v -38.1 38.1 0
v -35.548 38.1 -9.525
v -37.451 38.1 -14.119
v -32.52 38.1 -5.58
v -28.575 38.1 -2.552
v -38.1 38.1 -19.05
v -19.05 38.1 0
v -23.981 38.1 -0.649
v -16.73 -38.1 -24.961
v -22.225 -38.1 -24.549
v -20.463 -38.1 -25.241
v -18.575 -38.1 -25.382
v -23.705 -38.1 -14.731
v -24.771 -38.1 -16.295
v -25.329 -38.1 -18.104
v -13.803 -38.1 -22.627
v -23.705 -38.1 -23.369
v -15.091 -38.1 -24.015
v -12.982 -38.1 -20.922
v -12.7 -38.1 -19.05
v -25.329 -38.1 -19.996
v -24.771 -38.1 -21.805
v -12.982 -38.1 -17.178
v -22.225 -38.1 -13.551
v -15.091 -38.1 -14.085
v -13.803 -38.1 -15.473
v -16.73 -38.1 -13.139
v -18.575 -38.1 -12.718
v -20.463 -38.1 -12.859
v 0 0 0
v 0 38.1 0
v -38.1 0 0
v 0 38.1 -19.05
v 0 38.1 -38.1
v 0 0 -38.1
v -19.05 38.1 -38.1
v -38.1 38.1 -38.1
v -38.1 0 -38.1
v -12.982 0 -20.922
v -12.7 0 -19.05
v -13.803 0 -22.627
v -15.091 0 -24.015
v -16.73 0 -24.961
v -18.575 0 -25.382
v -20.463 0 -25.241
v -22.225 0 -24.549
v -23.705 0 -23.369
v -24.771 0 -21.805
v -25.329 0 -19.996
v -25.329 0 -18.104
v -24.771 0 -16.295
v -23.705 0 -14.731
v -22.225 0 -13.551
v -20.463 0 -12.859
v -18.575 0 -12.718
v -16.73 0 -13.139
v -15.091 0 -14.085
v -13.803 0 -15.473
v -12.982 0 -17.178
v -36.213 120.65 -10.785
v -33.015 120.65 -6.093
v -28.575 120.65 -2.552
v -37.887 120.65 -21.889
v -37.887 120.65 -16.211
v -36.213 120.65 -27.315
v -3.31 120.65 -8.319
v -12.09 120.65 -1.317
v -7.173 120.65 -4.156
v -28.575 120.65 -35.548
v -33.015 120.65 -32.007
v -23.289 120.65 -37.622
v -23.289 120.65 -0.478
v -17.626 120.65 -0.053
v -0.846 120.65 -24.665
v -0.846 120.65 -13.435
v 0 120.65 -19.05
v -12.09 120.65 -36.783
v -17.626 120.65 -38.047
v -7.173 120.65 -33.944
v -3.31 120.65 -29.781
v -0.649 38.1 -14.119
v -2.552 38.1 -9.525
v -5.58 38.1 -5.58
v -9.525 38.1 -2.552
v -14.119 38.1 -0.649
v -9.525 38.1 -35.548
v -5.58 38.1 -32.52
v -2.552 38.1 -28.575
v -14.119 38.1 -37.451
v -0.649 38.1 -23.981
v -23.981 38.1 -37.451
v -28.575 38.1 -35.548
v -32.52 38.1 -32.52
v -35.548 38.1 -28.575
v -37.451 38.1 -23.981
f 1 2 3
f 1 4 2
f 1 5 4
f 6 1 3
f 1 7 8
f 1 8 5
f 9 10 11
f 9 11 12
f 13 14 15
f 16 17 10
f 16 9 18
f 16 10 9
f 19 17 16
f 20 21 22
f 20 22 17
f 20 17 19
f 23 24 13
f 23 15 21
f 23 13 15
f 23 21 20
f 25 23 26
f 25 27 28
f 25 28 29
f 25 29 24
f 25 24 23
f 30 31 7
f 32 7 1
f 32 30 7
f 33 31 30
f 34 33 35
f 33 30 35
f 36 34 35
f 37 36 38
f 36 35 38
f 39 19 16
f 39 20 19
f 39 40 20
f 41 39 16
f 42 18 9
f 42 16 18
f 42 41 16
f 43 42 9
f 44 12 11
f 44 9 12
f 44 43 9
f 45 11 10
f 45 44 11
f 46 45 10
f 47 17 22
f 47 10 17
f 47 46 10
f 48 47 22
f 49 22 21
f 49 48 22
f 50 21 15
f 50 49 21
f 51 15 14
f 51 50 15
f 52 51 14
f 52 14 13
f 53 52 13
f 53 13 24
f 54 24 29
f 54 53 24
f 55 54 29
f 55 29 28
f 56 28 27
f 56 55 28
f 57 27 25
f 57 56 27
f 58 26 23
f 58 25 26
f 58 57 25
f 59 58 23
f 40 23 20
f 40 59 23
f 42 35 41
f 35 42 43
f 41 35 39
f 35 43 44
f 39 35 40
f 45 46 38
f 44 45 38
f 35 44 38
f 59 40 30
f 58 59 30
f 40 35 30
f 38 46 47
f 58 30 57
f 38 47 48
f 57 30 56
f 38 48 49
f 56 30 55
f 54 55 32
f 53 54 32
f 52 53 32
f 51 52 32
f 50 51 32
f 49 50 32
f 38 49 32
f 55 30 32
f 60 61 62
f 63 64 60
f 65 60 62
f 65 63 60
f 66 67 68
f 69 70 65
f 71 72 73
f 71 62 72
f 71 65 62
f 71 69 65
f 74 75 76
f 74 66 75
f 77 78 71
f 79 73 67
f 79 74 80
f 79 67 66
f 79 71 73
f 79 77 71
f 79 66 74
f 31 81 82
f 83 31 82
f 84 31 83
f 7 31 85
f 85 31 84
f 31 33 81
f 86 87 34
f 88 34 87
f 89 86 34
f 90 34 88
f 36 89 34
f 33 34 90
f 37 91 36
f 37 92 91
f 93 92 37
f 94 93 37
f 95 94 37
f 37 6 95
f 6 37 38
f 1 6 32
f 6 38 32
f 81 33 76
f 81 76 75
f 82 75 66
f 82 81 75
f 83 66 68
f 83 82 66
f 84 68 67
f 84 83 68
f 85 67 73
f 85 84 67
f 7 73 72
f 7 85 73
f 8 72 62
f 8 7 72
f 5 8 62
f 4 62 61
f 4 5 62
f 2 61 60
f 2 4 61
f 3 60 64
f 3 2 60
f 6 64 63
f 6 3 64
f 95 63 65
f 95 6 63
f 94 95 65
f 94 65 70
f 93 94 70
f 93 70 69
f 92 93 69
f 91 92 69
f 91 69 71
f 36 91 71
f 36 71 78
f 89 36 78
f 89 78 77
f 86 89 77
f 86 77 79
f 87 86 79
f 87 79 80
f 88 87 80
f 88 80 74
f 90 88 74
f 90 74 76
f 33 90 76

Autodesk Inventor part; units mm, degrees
ref_plane "YZ Plane" through (0, 0, 0) normal (1, 0, 0) x (0, 1, 0)
ref_plane "XZ Plane" through (0, 0, 0) normal (0, 1, 0) x (-1, 0, 0)
ref_plane "XY Plane" through (0, 0, 0) normal (0, 0, 1) x (1, 0, 0)
sketch "Sketch1" plane through (0, 0, 0) normal (0, 1, 0) x (-1, 0, 0)
  line L0 (0, 0) -> (38.1, 0)
  line L1 (0, 0) -> (0, -38.1)
  line L2 (0, -38.1) -> (38.1, -38.1)
  line L3 (38.1, -38.1) -> (38.1, 0)
  dimension "d0" = 38.1
  dimension "d2" = 38.1
extrude "Extrusion1" add sketch "Sketch1" along normal blind 38.1
sketch "Sketch2" plane through (0, 38.1, 0) normal (0, 1, 0) x (1, 0, 0)
  circle A0 centre (-19.05, 19.05) radius 19.05
  line L0 (-38.1, 0) -> (-38.1, 38.1) projected
  line L1 (-38.1, 38.1) -> (0, 38.1) projected
  point P0 (0, 0)
  dimension "d5" = 19.05
  dimension "d6" = 19.05
  dimension "d7" = 38.1
extrude "Extrusion2" add sketch "Sketch2" along normal blind 82.55 contours A0
sketch "Sketch3" plane through (0, 0, 0) normal (0, -1, 0) x (1, 0, 0)
  circle A0 centre (-19.05, -19.05) radius 6.35
  line L0 (0, -38.1) -> (0, 0) projected
  line L1 (0, 0) -> (-38.1, 0) projected
  dimension "d10" = 12.7
  dimension "d11" = 19.05
  dimension "d12" = 19.05
extrude "Extrusion3" add sketch "Sketch3" along normal blind 38.1
properties part number "NeveRest motor"
